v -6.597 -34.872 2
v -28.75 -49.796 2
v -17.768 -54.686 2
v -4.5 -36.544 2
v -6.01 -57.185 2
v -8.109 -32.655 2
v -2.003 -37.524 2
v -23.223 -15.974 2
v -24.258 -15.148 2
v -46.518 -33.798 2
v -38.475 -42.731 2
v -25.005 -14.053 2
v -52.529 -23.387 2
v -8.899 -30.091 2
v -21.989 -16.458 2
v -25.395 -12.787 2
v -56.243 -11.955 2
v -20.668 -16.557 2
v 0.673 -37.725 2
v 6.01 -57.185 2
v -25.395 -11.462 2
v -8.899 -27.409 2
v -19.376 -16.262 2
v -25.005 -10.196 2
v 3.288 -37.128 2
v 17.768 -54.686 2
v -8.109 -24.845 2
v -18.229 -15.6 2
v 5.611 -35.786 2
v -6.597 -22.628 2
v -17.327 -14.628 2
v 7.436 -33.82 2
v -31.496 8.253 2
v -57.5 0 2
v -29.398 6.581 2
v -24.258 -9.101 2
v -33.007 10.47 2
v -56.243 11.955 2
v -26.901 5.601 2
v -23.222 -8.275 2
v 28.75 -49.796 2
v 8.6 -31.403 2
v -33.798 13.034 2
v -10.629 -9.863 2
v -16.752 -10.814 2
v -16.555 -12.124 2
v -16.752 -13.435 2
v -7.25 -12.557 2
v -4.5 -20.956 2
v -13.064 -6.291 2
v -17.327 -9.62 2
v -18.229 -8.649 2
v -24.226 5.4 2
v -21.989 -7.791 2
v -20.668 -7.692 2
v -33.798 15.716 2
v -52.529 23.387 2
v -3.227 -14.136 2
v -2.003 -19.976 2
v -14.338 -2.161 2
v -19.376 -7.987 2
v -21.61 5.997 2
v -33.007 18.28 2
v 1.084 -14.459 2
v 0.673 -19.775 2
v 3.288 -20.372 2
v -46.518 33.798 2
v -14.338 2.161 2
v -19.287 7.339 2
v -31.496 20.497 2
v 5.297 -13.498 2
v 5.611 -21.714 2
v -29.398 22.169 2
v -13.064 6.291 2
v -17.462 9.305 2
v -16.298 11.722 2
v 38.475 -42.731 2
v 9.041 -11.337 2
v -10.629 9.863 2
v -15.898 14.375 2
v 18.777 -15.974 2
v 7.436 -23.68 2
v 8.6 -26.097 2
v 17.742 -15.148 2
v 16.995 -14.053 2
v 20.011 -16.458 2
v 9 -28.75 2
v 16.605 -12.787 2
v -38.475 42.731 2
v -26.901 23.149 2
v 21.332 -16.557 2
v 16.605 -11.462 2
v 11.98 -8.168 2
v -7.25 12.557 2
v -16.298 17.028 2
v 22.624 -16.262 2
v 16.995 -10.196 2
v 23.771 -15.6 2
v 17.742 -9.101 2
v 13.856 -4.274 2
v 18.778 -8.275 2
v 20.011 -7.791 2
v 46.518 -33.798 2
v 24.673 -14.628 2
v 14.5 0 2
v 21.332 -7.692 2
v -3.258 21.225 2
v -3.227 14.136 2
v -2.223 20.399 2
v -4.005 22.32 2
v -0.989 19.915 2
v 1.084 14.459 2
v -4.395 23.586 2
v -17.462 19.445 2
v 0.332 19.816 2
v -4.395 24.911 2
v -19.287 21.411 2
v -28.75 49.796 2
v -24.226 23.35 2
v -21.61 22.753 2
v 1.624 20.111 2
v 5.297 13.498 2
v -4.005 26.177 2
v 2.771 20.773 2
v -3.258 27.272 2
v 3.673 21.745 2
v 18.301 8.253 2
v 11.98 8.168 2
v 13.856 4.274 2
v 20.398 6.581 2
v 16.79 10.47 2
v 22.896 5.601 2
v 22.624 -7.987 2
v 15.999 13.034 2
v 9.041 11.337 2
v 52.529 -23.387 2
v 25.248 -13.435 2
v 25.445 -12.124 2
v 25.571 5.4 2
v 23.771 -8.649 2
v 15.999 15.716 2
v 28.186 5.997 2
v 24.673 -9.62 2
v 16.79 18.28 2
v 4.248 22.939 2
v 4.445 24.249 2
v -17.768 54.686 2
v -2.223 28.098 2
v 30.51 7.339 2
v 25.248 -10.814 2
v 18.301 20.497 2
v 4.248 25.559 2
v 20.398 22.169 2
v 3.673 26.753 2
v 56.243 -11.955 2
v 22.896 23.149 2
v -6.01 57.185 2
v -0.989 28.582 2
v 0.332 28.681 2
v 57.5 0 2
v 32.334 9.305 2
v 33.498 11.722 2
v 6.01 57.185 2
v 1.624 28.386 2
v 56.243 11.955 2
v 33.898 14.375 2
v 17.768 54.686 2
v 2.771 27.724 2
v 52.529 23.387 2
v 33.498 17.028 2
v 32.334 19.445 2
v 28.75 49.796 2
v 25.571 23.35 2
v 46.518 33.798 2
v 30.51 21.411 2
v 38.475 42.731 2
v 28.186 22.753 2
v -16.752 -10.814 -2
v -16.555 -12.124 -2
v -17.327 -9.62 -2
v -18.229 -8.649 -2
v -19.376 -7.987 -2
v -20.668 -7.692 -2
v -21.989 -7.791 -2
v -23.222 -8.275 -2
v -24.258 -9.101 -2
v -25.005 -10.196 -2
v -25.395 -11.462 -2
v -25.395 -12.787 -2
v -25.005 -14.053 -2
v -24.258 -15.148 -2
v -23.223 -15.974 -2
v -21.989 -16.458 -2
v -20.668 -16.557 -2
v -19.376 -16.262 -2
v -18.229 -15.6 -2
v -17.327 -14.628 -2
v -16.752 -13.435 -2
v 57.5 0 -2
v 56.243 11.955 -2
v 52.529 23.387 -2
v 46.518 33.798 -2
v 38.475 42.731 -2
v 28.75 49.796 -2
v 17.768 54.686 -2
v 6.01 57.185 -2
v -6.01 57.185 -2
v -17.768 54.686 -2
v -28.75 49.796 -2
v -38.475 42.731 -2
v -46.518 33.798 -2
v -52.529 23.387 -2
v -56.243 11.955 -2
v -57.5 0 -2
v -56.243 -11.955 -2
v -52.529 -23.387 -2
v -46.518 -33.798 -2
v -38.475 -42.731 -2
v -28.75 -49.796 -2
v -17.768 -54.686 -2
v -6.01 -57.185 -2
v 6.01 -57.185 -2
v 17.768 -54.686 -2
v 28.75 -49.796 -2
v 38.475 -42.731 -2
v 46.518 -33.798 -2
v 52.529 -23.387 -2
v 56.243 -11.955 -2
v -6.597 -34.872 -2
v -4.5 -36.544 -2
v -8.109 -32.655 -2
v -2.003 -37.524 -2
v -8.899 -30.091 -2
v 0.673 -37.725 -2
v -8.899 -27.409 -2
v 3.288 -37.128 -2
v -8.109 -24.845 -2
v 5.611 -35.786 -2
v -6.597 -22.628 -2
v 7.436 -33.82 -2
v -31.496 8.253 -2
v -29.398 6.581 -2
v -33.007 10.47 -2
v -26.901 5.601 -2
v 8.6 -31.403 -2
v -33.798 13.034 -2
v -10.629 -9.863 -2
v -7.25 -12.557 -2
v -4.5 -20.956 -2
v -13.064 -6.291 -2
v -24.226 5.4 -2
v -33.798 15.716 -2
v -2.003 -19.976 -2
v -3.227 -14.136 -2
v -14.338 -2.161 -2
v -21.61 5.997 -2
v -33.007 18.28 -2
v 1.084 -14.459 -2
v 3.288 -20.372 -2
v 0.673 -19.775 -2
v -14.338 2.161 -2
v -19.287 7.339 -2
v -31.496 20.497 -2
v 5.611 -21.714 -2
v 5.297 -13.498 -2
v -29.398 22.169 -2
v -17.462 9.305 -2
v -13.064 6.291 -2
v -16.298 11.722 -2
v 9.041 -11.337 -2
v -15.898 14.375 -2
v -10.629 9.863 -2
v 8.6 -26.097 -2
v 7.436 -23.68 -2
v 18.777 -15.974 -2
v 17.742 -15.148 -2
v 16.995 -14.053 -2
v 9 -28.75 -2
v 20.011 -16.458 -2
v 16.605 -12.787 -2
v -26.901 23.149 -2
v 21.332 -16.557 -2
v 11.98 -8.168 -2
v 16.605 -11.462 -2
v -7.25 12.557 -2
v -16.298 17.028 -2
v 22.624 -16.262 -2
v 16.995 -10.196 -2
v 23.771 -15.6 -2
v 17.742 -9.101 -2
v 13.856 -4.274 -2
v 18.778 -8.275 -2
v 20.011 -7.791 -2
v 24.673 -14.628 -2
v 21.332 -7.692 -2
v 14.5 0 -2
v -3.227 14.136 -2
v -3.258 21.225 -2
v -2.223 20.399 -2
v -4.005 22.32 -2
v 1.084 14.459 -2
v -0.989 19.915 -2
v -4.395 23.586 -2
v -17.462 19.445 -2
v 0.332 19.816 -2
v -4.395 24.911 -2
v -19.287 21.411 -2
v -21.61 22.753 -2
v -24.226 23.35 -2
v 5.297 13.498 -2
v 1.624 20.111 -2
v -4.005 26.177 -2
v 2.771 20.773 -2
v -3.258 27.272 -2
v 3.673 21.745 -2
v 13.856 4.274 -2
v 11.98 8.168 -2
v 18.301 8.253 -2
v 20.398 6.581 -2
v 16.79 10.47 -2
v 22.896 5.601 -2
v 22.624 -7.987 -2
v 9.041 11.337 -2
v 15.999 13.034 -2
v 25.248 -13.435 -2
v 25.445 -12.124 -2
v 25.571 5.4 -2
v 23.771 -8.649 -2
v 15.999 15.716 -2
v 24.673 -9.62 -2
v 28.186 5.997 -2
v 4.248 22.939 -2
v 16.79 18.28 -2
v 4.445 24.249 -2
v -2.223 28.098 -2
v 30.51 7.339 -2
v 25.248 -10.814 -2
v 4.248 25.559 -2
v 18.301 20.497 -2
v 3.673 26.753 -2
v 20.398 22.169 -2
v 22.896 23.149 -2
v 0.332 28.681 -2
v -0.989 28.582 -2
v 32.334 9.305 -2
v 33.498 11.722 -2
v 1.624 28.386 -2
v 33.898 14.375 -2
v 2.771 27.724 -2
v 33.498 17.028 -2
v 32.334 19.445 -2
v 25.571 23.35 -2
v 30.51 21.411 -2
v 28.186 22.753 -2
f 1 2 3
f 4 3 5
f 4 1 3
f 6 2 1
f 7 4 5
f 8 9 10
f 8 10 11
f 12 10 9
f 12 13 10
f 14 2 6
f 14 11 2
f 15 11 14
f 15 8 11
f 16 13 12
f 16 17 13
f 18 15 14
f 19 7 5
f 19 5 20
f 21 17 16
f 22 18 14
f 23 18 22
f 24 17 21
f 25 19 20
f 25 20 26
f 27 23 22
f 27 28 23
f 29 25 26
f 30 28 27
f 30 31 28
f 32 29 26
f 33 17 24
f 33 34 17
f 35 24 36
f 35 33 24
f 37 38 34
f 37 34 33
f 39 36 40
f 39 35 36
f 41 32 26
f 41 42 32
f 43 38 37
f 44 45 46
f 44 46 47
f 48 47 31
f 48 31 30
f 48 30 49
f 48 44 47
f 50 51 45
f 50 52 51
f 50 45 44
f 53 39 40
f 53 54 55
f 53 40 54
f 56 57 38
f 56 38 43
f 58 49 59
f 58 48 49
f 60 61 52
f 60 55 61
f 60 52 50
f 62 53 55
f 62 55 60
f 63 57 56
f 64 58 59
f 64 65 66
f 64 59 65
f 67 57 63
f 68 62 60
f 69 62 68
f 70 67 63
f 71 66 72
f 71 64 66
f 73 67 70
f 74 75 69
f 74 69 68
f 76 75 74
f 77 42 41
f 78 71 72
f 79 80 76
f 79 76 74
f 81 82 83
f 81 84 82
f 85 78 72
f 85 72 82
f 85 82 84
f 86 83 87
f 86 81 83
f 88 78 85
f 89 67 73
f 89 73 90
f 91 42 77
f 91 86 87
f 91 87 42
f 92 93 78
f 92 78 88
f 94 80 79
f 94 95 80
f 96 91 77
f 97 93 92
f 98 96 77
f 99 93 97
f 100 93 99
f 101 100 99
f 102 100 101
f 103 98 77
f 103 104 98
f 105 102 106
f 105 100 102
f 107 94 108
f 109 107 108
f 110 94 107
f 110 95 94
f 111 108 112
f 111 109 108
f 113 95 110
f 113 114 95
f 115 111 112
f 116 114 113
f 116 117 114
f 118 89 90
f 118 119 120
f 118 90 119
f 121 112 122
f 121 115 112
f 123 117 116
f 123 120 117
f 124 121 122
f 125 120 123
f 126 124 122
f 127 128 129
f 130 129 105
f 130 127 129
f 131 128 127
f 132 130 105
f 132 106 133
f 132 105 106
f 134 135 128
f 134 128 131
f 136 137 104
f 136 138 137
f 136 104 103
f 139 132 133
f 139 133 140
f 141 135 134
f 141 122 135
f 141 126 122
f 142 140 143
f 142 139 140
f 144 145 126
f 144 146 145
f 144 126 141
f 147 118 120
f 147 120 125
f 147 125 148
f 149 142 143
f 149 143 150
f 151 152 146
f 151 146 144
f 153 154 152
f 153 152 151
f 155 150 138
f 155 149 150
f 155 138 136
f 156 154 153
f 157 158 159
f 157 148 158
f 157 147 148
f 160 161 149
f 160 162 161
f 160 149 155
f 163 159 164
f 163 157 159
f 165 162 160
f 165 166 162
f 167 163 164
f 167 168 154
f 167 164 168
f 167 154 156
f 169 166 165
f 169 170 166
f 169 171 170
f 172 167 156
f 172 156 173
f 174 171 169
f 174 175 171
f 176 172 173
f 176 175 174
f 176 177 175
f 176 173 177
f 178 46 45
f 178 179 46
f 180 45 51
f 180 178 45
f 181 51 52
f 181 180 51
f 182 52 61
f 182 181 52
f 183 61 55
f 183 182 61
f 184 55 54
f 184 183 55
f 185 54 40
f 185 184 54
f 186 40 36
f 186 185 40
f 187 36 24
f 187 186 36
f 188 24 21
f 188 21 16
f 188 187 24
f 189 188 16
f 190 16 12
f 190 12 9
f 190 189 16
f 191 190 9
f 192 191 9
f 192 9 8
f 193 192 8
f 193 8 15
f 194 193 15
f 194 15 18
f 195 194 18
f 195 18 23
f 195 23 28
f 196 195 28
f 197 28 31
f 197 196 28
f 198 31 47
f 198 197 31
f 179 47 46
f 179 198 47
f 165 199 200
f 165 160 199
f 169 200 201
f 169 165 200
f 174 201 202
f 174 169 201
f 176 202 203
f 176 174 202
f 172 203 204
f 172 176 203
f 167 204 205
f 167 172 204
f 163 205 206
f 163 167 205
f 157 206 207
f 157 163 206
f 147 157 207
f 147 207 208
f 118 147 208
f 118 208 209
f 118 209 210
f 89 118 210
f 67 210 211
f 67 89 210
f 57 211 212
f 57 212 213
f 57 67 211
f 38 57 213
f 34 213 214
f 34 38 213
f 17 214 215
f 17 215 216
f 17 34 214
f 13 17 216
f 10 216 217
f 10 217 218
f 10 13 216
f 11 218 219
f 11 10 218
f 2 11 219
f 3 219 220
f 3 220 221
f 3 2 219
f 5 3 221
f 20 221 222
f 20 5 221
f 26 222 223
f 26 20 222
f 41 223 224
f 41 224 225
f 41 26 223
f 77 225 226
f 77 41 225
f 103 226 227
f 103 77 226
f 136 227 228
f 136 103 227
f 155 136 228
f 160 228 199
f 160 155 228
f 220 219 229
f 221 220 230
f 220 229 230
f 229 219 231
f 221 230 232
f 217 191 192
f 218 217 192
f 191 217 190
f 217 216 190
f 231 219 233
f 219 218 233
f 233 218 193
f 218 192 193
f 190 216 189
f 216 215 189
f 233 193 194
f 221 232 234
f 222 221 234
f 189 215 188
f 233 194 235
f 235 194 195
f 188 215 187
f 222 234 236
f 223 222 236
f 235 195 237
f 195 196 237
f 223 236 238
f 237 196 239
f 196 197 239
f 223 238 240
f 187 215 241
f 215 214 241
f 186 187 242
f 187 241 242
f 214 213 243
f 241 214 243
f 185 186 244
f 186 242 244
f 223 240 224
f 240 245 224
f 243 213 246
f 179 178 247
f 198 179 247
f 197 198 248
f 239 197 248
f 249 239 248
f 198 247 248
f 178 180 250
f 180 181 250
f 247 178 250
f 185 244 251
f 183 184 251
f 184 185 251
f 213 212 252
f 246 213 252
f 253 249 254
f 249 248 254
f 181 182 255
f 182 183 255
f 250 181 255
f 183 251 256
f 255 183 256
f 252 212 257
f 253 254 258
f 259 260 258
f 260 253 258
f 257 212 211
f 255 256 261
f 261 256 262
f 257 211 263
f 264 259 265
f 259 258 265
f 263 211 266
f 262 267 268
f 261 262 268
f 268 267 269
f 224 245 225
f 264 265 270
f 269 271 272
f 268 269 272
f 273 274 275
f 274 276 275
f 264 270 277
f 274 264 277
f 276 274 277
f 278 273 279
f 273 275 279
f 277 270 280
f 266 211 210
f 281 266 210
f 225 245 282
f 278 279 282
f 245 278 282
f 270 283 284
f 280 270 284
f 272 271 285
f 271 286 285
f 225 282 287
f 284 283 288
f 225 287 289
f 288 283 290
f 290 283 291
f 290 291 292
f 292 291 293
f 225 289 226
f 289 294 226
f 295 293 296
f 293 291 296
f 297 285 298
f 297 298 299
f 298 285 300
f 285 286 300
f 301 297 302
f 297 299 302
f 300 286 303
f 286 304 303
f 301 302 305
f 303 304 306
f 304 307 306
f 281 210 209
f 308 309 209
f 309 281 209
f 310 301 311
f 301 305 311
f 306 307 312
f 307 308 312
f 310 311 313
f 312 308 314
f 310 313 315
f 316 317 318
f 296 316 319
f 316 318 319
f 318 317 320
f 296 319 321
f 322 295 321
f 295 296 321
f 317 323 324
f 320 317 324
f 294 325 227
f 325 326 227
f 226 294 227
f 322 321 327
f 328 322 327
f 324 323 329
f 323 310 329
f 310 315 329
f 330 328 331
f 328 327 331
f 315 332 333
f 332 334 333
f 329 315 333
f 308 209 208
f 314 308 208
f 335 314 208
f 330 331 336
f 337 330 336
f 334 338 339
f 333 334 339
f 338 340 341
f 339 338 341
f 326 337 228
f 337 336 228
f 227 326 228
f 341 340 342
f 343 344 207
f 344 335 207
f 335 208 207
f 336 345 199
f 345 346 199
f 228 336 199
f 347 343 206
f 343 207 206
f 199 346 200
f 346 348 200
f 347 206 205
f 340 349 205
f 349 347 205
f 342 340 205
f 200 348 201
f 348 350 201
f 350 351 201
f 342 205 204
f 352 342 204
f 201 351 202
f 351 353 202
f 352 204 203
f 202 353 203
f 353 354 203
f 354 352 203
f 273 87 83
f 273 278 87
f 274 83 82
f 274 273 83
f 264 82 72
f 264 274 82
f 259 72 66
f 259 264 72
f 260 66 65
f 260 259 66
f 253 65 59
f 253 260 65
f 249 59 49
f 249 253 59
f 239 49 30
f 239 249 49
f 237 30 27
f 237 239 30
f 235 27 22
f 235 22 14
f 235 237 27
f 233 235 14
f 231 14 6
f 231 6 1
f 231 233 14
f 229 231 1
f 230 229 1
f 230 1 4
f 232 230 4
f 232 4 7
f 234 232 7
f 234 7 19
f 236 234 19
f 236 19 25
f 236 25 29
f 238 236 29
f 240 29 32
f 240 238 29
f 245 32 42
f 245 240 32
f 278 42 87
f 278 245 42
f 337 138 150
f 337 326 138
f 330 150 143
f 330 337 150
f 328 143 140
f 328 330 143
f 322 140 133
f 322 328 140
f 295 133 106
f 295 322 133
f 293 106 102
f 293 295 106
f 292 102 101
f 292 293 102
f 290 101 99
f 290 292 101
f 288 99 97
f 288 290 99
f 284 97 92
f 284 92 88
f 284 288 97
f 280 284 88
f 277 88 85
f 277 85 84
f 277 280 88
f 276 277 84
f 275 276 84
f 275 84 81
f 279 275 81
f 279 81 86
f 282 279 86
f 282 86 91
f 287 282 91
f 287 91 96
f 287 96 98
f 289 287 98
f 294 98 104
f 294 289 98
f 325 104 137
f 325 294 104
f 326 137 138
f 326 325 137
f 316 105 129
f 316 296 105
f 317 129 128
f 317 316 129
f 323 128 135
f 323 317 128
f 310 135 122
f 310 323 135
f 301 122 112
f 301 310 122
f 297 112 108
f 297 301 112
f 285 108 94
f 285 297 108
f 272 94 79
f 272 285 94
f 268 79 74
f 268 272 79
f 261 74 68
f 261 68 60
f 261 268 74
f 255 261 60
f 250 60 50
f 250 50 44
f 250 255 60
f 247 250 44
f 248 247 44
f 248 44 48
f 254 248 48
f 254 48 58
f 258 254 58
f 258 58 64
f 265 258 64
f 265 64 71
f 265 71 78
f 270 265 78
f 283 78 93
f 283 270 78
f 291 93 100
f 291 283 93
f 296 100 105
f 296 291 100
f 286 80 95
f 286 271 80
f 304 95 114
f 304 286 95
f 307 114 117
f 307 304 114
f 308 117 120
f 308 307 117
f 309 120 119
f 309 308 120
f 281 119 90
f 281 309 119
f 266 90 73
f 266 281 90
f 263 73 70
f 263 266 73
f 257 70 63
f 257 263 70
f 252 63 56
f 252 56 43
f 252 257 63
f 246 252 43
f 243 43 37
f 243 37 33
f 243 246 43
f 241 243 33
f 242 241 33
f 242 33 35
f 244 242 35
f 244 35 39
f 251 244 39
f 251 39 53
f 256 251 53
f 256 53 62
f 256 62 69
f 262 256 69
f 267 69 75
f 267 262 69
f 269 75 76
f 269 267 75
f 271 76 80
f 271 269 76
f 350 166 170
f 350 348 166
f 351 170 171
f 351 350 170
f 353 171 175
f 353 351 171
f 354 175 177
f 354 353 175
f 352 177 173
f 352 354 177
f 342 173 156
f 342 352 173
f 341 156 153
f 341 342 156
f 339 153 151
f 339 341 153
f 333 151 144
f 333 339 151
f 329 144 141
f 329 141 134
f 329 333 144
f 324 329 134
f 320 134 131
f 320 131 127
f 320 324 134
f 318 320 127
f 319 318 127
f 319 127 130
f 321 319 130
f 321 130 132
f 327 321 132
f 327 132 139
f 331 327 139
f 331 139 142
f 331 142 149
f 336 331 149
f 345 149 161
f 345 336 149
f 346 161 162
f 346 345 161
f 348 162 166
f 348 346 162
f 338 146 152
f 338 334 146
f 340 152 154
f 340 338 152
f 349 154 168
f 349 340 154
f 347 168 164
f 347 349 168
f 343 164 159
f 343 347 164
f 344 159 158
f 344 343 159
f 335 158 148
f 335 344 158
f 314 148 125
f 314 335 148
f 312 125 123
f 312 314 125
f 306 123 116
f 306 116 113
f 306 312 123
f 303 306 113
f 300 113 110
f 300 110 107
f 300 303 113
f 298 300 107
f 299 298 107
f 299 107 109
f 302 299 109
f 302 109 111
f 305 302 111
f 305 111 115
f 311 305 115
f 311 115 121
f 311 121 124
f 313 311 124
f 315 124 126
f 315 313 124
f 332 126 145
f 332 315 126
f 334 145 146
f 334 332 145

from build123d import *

# Parameters (mm, degrees)
SKETCH1_R           = 57.5
SKETCH1_R_2         = 14.5
SKETCH1_R_3         = 4.445
SKETCH1_R_4         = 9
BOSS_EXTRUDE1_DEPTH = 2


with BuildPart() as part:
    # Sketch1 → Boss-Extrude1 (new body, symmetric)
    with BuildSketch(Plane.XY):
        Circle(SKETCH1_R)
        Circle(SKETCH1_R_2, mode=Mode.SUBTRACT)
        with Locations((0, 24.248711306)):
            Circle(SKETCH1_R_3, mode=Mode.SUBTRACT)
        with Locations((-21, -12.124355653)):
            Circle(SKETCH1_R_3, mode=Mode.SUBTRACT)
        with Locations((21, -12.124355653)):
            Circle(SKETCH1_R_3, mode=Mode.SUBTRACT)
        with Locations((-24.898230359, 14.375)):
            Circle(SKETCH1_R_4, mode=Mode.SUBTRACT)
        with Locations((24.898230359, 14.375)):
            Circle(SKETCH1_R_4, mode=Mode.SUBTRACT)
        with Locations((0, -28.75)):
            Circle(SKETCH1_R_4, mode=Mode.SUBTRACT)
    extrude(amount=BOSS_EXTRUDE1_DEPTH, both=True)


solid = part.part
